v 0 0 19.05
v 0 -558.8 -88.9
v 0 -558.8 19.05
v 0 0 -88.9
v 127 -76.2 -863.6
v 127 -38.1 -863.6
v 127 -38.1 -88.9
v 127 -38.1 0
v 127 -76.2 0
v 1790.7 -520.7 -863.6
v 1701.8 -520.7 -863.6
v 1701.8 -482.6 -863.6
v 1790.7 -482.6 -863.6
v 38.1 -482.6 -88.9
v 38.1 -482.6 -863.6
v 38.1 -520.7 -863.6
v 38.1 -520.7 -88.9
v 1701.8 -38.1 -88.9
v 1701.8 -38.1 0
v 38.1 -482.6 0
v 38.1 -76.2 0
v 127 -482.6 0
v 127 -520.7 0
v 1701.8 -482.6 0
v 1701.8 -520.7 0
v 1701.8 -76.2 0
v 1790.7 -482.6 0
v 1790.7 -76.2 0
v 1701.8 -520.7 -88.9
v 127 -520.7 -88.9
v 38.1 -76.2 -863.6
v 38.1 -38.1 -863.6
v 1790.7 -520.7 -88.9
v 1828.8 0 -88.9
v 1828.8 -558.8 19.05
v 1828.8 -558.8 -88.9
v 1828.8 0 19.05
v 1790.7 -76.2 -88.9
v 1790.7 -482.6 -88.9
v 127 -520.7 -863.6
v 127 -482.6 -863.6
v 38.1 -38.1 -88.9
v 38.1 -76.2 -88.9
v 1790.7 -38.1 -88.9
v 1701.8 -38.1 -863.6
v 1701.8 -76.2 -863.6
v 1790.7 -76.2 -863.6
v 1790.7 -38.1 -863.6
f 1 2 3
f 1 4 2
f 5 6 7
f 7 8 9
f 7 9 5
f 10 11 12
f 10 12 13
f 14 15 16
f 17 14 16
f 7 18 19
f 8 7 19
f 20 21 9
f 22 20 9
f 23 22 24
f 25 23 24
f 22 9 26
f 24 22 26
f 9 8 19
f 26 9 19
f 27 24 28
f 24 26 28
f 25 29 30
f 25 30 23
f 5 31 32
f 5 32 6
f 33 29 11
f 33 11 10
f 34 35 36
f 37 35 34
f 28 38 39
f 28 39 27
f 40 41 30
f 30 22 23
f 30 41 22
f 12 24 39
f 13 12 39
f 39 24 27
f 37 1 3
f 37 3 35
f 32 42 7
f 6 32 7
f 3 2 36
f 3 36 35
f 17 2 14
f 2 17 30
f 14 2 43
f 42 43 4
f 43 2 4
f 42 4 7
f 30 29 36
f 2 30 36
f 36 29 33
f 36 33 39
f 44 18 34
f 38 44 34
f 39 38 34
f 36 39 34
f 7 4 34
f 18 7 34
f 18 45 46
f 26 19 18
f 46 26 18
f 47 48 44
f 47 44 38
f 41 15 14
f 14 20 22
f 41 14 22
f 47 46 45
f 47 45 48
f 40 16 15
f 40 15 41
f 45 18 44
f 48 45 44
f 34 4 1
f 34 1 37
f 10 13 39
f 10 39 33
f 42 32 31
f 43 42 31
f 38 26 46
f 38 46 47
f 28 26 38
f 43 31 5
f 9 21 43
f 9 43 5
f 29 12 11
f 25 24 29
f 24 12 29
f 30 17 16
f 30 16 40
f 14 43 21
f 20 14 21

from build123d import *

# Parameters (mm, degrees)
F0_W     = 1828.8
F0_H     = 558.8
F1_DEPTH = 19.05
F2_W     = 38.1
F2_H     = 88.9
F3_DEPTH = 1828.8
F4_W     = 38.1
F4_H     = 88.9
F5_DEPTH = 482.6
F6_W     = 88.9
F6_H     = 38.1
F7_DEPTH = 863.6


with BuildPart() as f1:
    # F0 (on Top) → F1 (new body)
    with BuildSketch(Plane.XY):
        with Locations((914.4, -279.4)):
            Rectangle(F0_W, F0_H)
    extrude(amount=F1_DEPTH)

    # F2 (on face) → F3 (join, through all)
    with BuildSketch(Plane.YZ.offset(1828.8)):
        with Locations((-539.75, -44.45)):
            Rectangle(F2_W, F2_H)
        with Locations((-19.05, -44.45)):
            Rectangle(F2_W, F2_H)
    extrude(amount=-F3_DEPTH)

    # F4 (on face) → F5 (join, through all)
    with BuildSketch(Plane.XZ.offset(38.1)):
        with Locations((19.05, -44.45)):
            Rectangle(F4_W, F4_H)
        with Locations((1809.75, -44.45)):
            Rectangle(F4_W, F4_H)
    extrude(amount=F5_DEPTH)

    # F6 (on face) → F7 (join)
    with BuildSketch(Plane(origin=(0, 0, 0), x_dir=(1, 0, 0), z_dir=(0, 0, -1))):
        with Locations((1746.25, 501.65)):
            Rectangle(F6_W, F6_H)
        with Locations((1746.25, 57.15)):
            Rectangle(F6_W, F6_H)
        with Locations((82.55, 57.15)):
            Rectangle(F6_W, F6_H)
        with Locations((82.55, 501.65)):
            Rectangle(F6_W, F6_H)
    extrude(amount=F7_DEPTH)


solid = f1.part
